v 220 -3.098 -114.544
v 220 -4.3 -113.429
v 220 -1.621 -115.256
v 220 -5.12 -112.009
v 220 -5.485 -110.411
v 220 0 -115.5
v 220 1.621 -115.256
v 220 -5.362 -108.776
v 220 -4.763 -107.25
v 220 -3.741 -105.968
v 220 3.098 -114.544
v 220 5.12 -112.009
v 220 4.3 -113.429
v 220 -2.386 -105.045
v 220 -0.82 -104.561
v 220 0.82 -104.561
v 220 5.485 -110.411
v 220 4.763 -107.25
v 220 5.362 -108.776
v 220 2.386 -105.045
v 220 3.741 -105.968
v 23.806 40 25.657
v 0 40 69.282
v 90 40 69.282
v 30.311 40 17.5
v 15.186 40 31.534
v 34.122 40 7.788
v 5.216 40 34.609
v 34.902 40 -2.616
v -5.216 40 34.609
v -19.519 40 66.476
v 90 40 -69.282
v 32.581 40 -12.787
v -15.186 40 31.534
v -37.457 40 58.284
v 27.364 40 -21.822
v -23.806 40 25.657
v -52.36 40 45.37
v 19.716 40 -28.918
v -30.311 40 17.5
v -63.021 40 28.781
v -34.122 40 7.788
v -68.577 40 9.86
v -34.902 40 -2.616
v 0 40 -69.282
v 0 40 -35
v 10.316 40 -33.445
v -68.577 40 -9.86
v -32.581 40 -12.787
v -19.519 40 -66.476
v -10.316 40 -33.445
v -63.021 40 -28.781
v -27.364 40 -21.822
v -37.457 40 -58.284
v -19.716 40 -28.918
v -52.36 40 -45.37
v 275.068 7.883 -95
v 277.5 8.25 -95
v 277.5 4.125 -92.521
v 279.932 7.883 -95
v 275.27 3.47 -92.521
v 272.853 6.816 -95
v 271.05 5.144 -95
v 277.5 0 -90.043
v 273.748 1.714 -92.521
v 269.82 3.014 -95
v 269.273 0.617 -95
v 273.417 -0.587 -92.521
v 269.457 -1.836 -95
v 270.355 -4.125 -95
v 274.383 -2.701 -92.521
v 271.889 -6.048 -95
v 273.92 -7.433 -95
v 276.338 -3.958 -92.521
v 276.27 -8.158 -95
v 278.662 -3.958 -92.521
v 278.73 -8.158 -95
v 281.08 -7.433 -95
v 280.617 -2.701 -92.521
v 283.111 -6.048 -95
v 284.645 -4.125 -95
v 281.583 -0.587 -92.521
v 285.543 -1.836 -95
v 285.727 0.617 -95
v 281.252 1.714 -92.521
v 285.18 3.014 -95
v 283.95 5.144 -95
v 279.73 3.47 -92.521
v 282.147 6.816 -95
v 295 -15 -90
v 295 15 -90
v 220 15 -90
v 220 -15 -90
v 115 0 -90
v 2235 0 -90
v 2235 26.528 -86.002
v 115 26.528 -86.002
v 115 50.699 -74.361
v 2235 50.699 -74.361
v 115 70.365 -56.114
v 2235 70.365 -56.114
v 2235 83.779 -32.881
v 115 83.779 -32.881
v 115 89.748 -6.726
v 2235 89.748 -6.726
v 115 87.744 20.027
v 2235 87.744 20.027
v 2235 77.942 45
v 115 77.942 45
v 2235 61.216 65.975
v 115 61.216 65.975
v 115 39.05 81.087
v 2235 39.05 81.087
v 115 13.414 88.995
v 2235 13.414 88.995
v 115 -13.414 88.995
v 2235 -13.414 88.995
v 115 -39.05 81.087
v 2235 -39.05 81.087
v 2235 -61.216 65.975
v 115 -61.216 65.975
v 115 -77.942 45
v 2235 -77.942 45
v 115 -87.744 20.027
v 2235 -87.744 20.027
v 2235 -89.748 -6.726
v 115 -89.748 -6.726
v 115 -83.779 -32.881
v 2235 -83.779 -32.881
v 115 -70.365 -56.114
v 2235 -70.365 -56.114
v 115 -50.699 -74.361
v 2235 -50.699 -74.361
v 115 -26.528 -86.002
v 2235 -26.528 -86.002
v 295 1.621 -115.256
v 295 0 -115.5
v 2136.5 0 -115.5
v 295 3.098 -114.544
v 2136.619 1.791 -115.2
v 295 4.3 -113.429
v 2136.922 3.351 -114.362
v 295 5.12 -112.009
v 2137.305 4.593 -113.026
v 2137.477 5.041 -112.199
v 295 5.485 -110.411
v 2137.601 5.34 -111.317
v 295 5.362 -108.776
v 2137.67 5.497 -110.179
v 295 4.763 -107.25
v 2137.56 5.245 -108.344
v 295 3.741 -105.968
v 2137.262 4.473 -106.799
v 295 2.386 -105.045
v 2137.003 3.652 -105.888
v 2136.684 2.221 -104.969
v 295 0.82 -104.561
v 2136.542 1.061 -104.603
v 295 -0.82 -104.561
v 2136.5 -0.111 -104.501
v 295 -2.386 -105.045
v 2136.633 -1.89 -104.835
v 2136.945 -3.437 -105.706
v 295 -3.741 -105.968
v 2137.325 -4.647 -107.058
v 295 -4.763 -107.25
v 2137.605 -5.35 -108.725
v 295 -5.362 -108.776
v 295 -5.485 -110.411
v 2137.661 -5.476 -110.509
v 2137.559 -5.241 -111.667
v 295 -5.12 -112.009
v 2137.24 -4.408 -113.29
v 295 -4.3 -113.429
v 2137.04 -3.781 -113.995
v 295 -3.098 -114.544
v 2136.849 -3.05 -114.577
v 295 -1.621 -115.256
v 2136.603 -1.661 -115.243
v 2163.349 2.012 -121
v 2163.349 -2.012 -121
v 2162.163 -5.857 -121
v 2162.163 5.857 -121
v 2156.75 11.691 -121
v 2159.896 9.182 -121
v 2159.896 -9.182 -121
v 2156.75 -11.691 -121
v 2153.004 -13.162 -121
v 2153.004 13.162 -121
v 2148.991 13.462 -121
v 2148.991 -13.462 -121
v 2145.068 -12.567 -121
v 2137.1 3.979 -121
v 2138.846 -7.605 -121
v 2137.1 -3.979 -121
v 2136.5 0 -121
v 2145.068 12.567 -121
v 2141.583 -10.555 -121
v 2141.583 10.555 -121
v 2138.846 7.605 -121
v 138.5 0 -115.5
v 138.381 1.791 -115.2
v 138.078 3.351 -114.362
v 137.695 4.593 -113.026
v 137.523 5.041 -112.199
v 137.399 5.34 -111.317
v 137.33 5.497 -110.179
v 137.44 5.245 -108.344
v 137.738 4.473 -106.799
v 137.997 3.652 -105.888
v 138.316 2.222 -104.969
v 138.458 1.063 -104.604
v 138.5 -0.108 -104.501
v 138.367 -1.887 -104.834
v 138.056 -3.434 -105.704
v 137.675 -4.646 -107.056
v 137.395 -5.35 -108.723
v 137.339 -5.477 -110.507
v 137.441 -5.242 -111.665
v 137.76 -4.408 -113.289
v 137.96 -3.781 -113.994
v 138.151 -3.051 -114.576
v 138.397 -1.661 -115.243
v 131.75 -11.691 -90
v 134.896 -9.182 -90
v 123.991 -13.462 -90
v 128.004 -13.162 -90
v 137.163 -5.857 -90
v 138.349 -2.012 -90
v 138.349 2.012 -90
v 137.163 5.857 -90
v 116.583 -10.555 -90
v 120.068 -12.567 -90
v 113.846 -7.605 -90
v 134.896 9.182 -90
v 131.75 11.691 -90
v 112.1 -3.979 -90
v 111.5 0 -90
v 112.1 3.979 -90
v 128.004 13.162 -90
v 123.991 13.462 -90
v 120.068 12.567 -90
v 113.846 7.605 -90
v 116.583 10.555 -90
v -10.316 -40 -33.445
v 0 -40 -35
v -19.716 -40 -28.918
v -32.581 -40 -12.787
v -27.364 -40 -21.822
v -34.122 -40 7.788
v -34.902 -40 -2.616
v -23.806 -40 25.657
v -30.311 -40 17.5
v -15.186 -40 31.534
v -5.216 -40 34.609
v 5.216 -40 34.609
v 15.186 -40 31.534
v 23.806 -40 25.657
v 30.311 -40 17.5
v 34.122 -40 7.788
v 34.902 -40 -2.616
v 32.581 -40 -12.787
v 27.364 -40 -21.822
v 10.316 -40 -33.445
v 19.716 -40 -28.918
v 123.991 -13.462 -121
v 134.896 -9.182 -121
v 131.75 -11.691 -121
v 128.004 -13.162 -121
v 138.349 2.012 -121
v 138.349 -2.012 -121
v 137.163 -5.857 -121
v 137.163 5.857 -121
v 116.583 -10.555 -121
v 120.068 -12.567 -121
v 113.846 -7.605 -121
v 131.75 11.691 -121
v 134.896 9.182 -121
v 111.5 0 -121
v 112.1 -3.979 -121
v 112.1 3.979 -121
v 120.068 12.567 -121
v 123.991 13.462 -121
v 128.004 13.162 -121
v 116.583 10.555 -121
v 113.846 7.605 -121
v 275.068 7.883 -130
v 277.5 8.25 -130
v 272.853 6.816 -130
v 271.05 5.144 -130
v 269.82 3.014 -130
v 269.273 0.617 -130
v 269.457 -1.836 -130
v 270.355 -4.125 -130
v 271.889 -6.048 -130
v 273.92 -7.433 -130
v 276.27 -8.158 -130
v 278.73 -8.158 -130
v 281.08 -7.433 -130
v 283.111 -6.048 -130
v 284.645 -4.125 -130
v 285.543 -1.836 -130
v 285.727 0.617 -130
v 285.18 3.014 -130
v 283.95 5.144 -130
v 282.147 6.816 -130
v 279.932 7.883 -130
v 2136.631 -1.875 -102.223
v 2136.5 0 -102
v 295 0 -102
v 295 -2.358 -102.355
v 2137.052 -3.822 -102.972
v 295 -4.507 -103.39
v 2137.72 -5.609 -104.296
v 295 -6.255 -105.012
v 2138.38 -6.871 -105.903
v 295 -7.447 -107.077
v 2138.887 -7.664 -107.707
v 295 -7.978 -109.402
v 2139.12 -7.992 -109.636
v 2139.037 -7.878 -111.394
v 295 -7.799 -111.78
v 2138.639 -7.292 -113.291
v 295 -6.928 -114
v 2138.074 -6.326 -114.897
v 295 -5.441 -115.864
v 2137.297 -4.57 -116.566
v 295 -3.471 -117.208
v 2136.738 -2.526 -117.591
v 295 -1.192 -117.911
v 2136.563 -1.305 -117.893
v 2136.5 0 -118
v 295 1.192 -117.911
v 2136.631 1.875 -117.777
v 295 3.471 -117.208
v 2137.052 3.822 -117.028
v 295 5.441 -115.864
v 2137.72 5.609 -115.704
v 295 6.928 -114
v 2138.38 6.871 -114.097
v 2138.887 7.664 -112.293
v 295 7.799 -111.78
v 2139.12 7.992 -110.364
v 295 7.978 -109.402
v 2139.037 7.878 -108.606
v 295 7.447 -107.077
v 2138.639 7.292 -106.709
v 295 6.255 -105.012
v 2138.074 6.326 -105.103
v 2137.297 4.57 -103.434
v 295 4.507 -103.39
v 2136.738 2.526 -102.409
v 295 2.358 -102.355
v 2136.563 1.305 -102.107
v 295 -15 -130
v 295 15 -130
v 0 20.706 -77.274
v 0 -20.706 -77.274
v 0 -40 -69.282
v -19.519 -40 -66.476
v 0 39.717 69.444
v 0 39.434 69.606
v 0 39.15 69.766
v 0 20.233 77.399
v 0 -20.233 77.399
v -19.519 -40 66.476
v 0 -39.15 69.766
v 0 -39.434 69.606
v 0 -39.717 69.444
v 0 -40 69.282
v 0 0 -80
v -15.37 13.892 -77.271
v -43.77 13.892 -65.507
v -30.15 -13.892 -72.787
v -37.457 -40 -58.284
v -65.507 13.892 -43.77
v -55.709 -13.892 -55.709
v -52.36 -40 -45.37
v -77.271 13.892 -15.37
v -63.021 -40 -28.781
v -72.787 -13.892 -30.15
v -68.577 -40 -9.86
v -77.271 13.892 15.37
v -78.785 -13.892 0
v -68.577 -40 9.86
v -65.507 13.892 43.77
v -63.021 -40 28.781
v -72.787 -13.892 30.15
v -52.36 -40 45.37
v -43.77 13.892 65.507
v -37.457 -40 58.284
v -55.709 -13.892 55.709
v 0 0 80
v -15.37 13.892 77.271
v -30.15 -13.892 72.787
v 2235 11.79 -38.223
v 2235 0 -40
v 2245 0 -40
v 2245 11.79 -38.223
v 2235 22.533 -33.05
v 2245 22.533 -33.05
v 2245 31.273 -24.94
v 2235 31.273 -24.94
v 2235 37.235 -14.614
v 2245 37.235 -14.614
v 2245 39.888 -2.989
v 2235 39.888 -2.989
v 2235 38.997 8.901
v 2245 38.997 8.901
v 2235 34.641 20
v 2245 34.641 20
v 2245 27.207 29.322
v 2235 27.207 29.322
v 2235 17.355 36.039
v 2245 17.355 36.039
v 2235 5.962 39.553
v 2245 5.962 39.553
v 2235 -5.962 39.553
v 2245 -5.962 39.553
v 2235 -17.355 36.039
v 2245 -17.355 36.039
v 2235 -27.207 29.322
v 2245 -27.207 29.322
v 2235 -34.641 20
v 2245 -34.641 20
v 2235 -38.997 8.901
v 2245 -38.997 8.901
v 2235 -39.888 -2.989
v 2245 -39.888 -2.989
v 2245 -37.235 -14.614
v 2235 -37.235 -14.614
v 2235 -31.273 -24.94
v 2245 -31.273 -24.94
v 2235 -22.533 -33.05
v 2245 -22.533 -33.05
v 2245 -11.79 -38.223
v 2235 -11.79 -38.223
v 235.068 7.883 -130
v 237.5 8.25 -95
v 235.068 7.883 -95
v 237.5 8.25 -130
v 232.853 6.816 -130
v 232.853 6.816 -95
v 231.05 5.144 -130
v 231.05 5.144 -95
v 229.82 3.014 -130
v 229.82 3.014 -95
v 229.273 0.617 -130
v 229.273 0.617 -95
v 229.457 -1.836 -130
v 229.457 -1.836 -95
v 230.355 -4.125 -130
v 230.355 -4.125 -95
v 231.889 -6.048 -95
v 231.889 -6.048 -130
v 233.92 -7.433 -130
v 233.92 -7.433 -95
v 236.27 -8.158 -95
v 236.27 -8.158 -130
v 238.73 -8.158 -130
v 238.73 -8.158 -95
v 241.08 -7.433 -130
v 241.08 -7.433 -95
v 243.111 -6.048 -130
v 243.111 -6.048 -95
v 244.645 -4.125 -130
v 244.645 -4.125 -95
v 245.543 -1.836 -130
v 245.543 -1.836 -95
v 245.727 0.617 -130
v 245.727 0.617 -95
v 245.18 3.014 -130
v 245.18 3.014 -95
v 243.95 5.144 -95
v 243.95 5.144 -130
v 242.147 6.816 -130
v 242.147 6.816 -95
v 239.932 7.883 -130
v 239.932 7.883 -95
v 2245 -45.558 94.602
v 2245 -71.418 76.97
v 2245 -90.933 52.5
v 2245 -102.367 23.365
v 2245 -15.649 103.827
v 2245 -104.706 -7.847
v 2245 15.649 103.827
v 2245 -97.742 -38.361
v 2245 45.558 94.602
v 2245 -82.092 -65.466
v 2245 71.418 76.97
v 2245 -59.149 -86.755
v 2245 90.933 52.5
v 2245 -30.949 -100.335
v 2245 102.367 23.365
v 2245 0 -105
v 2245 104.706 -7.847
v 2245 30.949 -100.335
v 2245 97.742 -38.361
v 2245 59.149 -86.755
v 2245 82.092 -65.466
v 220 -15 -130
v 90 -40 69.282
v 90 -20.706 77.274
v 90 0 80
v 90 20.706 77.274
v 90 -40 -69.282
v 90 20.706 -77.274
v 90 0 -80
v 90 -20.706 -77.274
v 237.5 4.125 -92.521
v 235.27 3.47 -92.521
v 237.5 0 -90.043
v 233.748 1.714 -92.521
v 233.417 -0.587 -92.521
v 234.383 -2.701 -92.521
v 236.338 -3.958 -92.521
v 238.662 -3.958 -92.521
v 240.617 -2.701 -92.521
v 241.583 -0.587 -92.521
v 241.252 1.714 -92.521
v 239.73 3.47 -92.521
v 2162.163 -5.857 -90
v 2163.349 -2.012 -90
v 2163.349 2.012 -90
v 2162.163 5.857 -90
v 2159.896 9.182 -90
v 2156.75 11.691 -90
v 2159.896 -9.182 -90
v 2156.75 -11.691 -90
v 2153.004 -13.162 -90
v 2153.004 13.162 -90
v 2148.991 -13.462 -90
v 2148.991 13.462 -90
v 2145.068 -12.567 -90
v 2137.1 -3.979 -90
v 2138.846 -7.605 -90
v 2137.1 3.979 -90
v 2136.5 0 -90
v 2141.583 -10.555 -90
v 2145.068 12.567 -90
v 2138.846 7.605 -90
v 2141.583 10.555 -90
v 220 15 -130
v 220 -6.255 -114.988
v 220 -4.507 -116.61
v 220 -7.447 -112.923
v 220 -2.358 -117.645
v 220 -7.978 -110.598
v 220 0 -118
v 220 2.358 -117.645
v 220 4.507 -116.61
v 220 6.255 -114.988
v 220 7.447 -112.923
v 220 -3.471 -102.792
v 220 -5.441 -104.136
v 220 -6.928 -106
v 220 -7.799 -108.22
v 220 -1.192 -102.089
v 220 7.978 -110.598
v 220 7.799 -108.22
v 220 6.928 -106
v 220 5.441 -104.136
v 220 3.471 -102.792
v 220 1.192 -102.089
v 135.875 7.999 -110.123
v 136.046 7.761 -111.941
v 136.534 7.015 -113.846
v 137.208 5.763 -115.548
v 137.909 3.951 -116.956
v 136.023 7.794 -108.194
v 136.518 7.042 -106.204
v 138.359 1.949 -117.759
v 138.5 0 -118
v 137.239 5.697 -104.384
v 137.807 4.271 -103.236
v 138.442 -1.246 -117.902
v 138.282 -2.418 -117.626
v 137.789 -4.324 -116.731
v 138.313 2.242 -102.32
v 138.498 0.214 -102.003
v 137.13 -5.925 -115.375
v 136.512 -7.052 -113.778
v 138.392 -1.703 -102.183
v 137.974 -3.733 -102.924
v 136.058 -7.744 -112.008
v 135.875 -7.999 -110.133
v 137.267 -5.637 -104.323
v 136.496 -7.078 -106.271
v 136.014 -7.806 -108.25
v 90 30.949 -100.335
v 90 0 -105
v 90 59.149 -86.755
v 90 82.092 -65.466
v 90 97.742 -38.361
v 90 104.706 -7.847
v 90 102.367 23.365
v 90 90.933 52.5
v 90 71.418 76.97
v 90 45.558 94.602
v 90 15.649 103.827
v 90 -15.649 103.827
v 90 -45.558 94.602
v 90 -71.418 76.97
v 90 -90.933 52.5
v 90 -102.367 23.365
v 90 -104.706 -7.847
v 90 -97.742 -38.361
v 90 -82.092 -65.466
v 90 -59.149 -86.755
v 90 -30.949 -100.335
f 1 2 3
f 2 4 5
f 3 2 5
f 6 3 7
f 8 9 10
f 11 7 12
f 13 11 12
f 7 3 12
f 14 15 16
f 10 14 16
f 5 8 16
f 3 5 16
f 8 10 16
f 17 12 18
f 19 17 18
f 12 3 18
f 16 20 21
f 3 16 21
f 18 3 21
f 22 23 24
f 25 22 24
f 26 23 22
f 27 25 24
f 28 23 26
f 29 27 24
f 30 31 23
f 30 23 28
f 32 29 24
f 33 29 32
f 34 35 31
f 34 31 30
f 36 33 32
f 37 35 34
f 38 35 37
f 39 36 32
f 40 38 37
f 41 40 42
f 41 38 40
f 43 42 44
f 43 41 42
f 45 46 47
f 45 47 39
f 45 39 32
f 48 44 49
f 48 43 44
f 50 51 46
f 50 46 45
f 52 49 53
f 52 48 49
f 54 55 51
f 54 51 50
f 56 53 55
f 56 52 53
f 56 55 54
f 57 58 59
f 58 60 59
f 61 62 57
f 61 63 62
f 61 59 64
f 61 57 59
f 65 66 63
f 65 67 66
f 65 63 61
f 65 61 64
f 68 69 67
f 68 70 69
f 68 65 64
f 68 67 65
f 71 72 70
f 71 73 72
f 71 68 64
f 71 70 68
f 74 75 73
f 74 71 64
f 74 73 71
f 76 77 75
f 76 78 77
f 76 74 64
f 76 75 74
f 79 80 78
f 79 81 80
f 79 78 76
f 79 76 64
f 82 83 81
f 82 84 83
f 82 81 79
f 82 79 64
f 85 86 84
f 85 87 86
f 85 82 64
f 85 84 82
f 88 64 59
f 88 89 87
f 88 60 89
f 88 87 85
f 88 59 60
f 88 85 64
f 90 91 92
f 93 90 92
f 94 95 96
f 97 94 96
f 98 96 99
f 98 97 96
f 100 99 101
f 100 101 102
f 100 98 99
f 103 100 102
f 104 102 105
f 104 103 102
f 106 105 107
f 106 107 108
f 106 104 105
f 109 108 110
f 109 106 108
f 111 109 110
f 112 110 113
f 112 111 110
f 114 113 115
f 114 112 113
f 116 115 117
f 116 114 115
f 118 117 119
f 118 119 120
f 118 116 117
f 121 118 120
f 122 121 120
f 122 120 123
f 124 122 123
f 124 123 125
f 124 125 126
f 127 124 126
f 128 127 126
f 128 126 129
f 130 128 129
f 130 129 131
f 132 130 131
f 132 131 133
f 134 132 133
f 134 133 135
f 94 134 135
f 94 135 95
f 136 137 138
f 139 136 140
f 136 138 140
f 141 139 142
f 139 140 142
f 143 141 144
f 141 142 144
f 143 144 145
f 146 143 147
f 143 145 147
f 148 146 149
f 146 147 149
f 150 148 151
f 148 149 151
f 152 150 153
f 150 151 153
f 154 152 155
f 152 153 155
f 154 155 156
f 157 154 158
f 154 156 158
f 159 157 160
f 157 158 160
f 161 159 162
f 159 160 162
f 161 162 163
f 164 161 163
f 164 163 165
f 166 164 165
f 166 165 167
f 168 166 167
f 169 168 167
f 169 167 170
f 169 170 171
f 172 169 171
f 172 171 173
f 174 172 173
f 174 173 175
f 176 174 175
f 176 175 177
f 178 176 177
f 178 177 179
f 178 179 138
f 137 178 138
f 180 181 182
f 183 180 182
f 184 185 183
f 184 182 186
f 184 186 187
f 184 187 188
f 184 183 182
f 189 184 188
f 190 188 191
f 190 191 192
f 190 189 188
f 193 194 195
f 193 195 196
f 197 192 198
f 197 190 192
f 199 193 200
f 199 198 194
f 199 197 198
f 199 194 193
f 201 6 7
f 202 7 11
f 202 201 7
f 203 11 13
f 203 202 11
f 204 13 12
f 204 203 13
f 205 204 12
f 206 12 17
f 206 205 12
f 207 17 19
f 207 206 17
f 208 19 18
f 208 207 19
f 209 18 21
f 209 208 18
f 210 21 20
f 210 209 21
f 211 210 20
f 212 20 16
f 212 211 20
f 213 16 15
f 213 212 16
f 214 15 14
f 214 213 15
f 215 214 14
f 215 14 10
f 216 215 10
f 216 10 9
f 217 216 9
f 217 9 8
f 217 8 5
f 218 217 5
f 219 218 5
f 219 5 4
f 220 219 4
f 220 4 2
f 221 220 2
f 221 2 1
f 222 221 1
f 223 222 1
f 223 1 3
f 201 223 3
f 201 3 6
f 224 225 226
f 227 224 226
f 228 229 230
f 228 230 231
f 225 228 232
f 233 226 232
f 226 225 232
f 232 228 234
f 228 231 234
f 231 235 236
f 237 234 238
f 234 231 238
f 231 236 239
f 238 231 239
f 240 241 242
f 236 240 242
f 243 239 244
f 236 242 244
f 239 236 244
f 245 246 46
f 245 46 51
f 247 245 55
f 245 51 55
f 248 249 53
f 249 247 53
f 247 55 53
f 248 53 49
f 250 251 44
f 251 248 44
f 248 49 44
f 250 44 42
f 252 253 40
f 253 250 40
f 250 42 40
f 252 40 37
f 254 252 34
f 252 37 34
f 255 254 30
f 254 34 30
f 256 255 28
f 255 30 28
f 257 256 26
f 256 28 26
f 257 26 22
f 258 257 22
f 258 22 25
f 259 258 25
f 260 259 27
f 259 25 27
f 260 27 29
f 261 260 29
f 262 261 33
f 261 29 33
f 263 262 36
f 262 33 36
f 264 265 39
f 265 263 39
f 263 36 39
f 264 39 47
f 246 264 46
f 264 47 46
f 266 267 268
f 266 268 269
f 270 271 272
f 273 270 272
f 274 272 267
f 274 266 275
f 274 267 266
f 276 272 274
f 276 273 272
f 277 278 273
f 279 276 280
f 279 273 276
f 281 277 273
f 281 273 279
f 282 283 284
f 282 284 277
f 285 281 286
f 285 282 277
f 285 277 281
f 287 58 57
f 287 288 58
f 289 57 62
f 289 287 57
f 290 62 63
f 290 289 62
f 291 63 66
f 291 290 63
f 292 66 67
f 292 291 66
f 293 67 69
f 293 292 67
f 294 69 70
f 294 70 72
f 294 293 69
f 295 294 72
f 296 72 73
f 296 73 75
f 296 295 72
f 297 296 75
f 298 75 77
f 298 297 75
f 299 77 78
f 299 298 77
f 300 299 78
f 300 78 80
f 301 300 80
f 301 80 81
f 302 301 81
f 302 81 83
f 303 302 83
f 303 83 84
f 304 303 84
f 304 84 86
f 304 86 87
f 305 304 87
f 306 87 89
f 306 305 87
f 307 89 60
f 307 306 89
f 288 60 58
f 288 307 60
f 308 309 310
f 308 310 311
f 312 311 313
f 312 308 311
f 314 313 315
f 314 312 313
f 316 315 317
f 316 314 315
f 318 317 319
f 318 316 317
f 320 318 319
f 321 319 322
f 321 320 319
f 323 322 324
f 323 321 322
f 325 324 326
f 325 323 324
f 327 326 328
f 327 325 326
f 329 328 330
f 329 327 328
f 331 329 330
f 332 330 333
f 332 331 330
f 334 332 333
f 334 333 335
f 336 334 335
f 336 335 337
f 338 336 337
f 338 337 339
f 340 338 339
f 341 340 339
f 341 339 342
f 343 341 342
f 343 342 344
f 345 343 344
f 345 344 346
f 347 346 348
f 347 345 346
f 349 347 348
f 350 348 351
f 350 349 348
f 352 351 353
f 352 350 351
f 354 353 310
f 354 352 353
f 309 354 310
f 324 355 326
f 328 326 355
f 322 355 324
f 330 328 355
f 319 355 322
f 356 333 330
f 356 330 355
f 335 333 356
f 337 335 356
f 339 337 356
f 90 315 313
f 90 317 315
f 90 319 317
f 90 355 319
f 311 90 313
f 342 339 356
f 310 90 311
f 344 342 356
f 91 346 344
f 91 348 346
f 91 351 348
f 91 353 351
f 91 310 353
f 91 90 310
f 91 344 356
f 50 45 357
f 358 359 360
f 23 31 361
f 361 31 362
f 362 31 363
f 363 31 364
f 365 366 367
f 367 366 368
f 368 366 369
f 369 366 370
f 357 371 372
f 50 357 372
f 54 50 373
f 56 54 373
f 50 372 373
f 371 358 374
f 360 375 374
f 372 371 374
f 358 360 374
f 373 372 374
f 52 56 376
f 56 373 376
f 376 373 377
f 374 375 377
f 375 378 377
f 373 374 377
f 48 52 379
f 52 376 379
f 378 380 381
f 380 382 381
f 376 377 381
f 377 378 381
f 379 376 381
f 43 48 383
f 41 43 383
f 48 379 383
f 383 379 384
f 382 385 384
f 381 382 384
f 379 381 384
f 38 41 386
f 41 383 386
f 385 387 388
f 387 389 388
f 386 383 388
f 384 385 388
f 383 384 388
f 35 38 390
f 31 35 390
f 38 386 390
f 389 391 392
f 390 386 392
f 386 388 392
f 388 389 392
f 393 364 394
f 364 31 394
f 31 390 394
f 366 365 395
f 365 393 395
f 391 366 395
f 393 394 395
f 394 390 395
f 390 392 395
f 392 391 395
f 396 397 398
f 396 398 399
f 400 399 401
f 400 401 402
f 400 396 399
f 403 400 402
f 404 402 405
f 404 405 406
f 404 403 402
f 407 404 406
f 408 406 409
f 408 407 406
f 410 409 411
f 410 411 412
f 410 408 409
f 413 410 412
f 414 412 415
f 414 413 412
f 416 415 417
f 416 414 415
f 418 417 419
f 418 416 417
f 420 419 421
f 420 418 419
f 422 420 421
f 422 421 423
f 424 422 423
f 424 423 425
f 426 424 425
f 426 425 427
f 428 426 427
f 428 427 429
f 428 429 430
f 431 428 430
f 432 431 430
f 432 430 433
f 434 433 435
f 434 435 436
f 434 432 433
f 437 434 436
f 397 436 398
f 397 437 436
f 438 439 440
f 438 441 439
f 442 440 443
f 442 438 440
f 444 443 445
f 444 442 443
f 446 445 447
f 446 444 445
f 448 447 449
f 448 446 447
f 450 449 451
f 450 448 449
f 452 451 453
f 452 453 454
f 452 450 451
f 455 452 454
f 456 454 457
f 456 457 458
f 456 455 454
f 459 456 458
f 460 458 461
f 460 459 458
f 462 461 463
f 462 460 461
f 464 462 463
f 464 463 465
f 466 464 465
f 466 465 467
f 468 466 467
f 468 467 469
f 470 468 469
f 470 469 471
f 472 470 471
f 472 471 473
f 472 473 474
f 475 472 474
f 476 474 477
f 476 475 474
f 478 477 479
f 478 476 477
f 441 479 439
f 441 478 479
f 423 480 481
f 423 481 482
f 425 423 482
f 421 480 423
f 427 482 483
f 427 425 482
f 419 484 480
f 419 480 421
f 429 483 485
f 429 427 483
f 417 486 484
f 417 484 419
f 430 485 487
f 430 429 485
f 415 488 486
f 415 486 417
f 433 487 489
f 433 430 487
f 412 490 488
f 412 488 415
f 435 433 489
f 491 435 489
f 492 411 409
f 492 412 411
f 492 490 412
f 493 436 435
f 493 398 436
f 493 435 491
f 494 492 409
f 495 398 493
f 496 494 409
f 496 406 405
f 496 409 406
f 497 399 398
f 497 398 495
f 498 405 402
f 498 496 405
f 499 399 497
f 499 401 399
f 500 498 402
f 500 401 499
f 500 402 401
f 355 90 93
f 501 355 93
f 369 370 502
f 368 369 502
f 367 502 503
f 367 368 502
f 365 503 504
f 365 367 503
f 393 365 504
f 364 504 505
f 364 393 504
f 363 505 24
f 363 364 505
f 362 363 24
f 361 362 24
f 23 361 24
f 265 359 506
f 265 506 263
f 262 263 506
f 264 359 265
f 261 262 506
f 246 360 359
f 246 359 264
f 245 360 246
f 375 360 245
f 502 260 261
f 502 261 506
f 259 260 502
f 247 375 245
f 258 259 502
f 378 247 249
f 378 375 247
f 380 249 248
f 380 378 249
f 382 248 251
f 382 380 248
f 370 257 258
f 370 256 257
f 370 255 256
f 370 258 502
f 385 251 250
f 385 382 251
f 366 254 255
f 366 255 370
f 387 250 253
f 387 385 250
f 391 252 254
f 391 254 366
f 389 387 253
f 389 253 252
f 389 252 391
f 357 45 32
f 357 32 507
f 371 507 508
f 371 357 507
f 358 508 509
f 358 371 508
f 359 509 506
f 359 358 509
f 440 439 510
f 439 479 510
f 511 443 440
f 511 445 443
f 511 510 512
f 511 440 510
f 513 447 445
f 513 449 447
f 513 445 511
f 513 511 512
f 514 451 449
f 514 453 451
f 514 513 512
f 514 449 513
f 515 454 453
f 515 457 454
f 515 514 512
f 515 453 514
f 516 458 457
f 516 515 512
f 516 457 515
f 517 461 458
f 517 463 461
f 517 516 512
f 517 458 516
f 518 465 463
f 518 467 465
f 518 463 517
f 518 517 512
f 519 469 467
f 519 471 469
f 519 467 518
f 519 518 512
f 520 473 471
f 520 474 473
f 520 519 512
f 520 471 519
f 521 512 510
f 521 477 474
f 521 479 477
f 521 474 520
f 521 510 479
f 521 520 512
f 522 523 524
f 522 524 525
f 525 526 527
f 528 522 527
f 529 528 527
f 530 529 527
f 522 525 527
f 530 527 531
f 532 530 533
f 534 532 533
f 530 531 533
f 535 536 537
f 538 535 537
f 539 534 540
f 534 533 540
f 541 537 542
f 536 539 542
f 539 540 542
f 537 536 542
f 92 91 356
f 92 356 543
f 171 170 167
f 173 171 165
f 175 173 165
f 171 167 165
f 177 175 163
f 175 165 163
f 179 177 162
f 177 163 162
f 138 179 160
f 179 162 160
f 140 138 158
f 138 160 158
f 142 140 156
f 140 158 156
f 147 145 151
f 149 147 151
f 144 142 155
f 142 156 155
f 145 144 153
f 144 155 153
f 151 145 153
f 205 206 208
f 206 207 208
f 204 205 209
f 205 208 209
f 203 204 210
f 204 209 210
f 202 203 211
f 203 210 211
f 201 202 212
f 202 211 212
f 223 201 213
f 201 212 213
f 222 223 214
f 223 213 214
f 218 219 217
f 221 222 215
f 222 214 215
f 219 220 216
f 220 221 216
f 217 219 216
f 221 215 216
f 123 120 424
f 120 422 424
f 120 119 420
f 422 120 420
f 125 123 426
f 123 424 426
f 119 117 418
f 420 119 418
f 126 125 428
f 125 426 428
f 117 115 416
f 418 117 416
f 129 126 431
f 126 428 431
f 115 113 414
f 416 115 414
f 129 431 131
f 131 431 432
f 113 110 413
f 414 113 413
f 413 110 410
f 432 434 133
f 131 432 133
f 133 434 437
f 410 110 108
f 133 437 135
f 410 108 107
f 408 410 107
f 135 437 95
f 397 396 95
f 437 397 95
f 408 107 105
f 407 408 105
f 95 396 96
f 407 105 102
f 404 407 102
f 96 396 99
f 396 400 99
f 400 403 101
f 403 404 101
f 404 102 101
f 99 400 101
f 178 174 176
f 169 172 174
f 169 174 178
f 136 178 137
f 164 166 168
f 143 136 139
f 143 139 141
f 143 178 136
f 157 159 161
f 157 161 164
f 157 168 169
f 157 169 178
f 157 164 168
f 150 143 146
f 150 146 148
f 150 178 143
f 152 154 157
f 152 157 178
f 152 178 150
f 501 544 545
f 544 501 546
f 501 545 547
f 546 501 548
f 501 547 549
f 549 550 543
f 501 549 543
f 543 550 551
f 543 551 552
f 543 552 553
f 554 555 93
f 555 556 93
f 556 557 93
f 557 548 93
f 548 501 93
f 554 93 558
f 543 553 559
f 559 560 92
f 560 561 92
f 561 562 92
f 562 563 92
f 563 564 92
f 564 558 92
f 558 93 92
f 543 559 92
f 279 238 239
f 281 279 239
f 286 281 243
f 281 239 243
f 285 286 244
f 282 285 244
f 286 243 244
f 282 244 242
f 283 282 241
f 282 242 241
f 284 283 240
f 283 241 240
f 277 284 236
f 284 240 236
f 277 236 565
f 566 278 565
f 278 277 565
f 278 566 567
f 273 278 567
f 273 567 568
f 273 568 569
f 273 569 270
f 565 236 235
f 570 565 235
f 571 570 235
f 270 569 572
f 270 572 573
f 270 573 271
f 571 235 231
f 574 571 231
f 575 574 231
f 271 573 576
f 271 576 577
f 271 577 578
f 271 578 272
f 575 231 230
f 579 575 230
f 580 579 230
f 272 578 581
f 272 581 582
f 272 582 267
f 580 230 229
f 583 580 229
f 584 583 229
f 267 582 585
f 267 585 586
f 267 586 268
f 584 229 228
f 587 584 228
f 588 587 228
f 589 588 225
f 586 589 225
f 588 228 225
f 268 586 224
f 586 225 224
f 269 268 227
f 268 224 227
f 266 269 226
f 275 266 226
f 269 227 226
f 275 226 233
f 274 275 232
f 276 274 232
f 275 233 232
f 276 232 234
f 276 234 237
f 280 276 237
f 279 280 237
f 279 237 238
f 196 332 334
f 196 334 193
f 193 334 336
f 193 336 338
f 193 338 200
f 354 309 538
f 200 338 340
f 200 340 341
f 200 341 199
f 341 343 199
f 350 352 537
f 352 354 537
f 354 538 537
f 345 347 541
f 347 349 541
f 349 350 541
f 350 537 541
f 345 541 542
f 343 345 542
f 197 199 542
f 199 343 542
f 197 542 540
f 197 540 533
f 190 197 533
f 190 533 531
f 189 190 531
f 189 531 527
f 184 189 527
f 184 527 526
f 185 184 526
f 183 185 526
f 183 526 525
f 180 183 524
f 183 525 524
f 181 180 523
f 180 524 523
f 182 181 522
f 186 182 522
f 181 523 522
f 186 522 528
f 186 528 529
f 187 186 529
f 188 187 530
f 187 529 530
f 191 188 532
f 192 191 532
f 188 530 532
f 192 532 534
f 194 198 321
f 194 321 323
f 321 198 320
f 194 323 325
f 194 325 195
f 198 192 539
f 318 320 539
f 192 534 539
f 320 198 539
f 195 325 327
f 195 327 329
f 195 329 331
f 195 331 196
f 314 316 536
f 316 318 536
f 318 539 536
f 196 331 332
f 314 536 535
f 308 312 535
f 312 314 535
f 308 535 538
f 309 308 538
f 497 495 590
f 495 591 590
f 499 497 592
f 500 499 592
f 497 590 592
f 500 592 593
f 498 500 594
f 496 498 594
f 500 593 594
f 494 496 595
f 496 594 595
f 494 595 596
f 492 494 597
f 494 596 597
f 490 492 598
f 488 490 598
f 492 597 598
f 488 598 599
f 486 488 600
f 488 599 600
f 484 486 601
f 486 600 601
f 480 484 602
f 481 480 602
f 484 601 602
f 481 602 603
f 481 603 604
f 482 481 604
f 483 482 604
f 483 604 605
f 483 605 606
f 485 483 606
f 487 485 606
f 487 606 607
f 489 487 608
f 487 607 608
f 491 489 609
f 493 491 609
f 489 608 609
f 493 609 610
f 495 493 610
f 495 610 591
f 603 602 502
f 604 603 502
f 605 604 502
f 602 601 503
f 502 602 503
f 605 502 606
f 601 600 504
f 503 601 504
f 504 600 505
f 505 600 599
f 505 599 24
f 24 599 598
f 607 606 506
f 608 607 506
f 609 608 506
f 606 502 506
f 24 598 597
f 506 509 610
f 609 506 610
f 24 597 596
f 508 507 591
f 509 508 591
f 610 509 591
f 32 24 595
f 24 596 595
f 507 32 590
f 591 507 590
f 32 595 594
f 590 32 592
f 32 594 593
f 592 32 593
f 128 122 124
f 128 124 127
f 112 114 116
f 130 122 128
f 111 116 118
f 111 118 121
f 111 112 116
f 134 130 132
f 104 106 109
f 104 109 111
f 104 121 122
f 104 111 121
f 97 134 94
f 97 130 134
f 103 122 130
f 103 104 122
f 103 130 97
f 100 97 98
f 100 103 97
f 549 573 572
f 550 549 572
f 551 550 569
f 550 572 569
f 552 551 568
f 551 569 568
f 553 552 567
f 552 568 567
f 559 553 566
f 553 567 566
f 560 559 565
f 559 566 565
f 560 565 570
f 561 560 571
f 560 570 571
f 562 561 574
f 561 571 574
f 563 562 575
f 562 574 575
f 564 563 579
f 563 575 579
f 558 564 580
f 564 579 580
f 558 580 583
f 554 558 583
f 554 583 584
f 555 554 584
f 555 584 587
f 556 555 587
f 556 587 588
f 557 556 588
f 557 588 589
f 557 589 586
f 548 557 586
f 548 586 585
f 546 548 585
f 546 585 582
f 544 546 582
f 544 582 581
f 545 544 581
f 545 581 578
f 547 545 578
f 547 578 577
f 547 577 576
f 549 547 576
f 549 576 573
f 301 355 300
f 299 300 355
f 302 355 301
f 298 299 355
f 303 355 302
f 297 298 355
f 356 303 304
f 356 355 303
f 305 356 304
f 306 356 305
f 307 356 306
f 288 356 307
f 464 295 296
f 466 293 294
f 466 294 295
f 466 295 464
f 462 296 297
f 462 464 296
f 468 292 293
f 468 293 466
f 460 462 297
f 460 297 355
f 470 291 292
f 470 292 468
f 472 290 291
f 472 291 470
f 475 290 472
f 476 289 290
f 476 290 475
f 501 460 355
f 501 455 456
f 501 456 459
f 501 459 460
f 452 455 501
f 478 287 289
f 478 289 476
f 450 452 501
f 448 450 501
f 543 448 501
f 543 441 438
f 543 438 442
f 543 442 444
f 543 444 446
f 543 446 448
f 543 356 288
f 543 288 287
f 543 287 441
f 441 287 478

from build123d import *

# Parameters (mm, degrees)
SKETCH_3_W           = 88.479839294
SKETCH_3_H           = 156.072634557
CUT_EXTRUDE_1_DEPTH  = 112
EXTRUDE_3_DEPTH      = 90
SKETCH_5_R           = 35
CUT_EXTRUDE_2_DEPTH  = 145.568322948
SKETCH_6_R           = 105
EXTRUDE_4_DEPTH      = 25
SKETCH_7_R           = 105
SKETCH_7_R_2         = 90
EXTRUDE_5_DEPTH      = 2130
EXTRUDE_START        = -10
SKETCH_8_R           = 90
SKETCH_8_R_2         = 40
EXTRUDE_6_DEPTH      = 10
SKETCH_9_R           = 13.5
EXTRUDE_7_DEPTH      = 31
EXTRUDE_7_2_DEPTH    = 31
SKETCH_10_W          = 75
SKETCH_10_H          = 30
EXTRUDE_8_DEPTH      = 40
SKETCH_11_R          = 8
SKETCH_11_R_2        = 5.5
EXTRUDE_9_DEPTH      = 1855
SKETCH_12_R          = 8
SKETCH_12_R_2        = 5.5
EXTRUDE_10_DEPTH     = 95
M18X1_5_1_AT_2_COUNT = 2
M18X1_5_1_AT_2_PITCH = 40


with BuildPart() as part:
    # 草图1 → 旋转1 (revolve)
    with BuildSketch(Plane.XY, mode=Mode.PRIVATE) as revolve_1_sk:
        with BuildLine():
            Line((35, -40), (35, 40))
            Line((35, 40), (69.282032303, 40))
            ThreePointArc((69.282032303, 40), (80, 0), (69.282032303, -40))
            Line((69.282032303, -40), (35, -40))
        make_face()
    revolve(revolve_1_sk.sketch.rotate(Axis((0, 0, 0), (0, 1, 0)), 90), axis=Axis((0, 0, 0), (0, 1, 0)))

    # 草图3 → 切除-拉伸1 (cut)
    with BuildSketch(Plane(origin=(0, 40, 0), x_dir=(1, 0, 0), z_dir=(0, 1, 0))):
        with Locations((44.239919647, 8.27055624)):
            Rectangle(SKETCH_3_W, SKETCH_3_H)
    extrude(amount=-CUT_EXTRUDE_1_DEPTH, mode=Mode.SUBTRACT)

    # 草图4 → 凸台-拉伸3 (add)
    with BuildSketch(Plane(origin=(0, 0, 0), x_dir=(0, 0, -1), z_dir=(1, 0, 0))):
        with BuildLine():
            Line((-69.282032303, 40), (69.282032303, 40))
            ThreePointArc((69.282032303, 40), (80, 0), (69.282032303, -40))
            Line((69.282032303, -40), (-69.282032303, -40))
            ThreePointArc((-69.282032303, -40), (-80, 0), (-69.282032303, 40))
        make_face()
    extrude(amount=EXTRUDE_3_DEPTH)

    # 草图5 → 切除-拉伸2 (cut, through all)
    with BuildSketch(Plane(origin=(0, 40, 0), x_dir=(1, 0, 0), z_dir=(0, 1, 0))):
        with Locations(Location((0, 0, 0), (0, 0, 90))):
            Circle(SKETCH_5_R)
    extrude(amount=-CUT_EXTRUDE_2_DEPTH, mode=Mode.SUBTRACT)

    # 草图6 → 凸台-拉伸4 (add)
    with BuildSketch(Plane(origin=(90, 0, 0), x_dir=(0, 0, -1), z_dir=(1, 0, 0))):
        Circle(SKETCH_6_R)
    extrude(amount=EXTRUDE_4_DEPTH)

    # 草图7 → 凸台-拉伸5 (add)
    with BuildSketch(Plane(origin=(115, 0, 0), x_dir=(0, 0, -1), z_dir=(1, 0, 0))):
        Circle(SKETCH_7_R)
        Circle(SKETCH_7_R_2, mode=Mode.SUBTRACT)
    extrude(amount=EXTRUDE_5_DEPTH)

    # 草图8 → 凸台-拉伸6 (add)
    with BuildSketch(Plane(origin=(2245, 0, 0), x_dir=(0, 0, -1), z_dir=(1, 0, 0)).offset(EXTRUDE_START)):
        Circle(SKETCH_8_R)
        Circle(SKETCH_8_R_2, mode=Mode.SUBTRACT)
    extrude(amount=EXTRUDE_6_DEPTH)


with BuildPart() as body_2:
    # 草图9 → 凸台-拉伸7 (new body)
    with BuildSketch(Plane(origin=(0, 0, -90), x_dir=(-1, 0, 0), z_dir=(0, 0, -1))):
        with Locations((-2150, 0)):
            Circle(SKETCH_9_R)
    extrude(amount=EXTRUDE_7_DEPTH)



with BuildPart() as body_3:
    # 草图9 → Extrude 7 2 (new body)
    with BuildSketch(Plane(origin=(0, 0, -90), x_dir=(-1, 0, 0), z_dir=(0, 0, -1))):
        with Locations((-125, 0)):
            Circle(SKETCH_9_R)
    extrude(amount=EXTRUDE_7_2_DEPTH)



with BuildPart() as body_4:
    # 草图10 → 凸台-拉伸8 (new body)
    with BuildSketch(Plane(origin=(0, 0, -90), x_dir=(-1, 0, 0), z_dir=(0, 0, -1))):
        with Locations((-257.5, 0)):
            Rectangle(SKETCH_10_W, SKETCH_10_H)
    extrude(amount=EXTRUDE_8_DEPTH)


with BuildPart() as body_2_1:
    add(body_2.part)

    add(body_4.part)  # 凸台-拉伸9 merges body 4
    # 草图11 → 凸台-拉伸9 (add)
    with BuildSketch(Plane(origin=(2150, 0, 0), x_dir=(0, 0, -1), z_dir=(1, 0, 0))):
        with Locations(Location((110, 0, 0), (0, 0, 180))):
            Circle(SKETCH_11_R)
        with Locations((110, 0)):
            Circle(SKETCH_11_R_2, mode=Mode.SUBTRACT)
    extrude(amount=-EXTRUDE_9_DEPTH)


with BuildPart() as body_3_1:
    add(body_3.part)

    add(body_2_1.part)  # 凸台-拉伸10 merges body 2
    # 草图12 → 凸台-拉伸10 (add)
    with BuildSketch(Plane(origin=(125, 0, 0), x_dir=(0, 0, -1), z_dir=(1, 0, 0))):
        with Locations((110, 0)):
            Circle(SKETCH_12_R)
        with Locations((110, 0)):
            Circle(SKETCH_12_R_2, mode=Mode.SUBTRACT)
    extrude(amount=EXTRUDE_10_DEPTH)

    # 草图14 → M18x1.5 螺纹孔1 (revolve, cut)
    with BuildSketch(Plane(origin=(277.5, 0, -130), x_dir=(0, 1, 0), z_dir=(1, 0, 0))):
        Polygon((0, 0), (0, 39.957100107), (8.25, 35), (8.25, 0), align=None)
    m18x1_5_1 = revolve(axis=Axis((277.5, 0, -136.35), (0, 0, 1)), mode=Mode.SUBTRACT)

    # M18x1.5 螺纹孔1 at 2: M18x1.5 螺纹孔1 ×2
    with Locations(*[(-i * M18X1_5_1_AT_2_PITCH, 0, 0) for i in range(1, M18X1_5_1_AT_2_COUNT)]):
        add(m18x1_5_1, mode=Mode.SUBTRACT)


solid = Compound([part.part, body_3_1.part])
